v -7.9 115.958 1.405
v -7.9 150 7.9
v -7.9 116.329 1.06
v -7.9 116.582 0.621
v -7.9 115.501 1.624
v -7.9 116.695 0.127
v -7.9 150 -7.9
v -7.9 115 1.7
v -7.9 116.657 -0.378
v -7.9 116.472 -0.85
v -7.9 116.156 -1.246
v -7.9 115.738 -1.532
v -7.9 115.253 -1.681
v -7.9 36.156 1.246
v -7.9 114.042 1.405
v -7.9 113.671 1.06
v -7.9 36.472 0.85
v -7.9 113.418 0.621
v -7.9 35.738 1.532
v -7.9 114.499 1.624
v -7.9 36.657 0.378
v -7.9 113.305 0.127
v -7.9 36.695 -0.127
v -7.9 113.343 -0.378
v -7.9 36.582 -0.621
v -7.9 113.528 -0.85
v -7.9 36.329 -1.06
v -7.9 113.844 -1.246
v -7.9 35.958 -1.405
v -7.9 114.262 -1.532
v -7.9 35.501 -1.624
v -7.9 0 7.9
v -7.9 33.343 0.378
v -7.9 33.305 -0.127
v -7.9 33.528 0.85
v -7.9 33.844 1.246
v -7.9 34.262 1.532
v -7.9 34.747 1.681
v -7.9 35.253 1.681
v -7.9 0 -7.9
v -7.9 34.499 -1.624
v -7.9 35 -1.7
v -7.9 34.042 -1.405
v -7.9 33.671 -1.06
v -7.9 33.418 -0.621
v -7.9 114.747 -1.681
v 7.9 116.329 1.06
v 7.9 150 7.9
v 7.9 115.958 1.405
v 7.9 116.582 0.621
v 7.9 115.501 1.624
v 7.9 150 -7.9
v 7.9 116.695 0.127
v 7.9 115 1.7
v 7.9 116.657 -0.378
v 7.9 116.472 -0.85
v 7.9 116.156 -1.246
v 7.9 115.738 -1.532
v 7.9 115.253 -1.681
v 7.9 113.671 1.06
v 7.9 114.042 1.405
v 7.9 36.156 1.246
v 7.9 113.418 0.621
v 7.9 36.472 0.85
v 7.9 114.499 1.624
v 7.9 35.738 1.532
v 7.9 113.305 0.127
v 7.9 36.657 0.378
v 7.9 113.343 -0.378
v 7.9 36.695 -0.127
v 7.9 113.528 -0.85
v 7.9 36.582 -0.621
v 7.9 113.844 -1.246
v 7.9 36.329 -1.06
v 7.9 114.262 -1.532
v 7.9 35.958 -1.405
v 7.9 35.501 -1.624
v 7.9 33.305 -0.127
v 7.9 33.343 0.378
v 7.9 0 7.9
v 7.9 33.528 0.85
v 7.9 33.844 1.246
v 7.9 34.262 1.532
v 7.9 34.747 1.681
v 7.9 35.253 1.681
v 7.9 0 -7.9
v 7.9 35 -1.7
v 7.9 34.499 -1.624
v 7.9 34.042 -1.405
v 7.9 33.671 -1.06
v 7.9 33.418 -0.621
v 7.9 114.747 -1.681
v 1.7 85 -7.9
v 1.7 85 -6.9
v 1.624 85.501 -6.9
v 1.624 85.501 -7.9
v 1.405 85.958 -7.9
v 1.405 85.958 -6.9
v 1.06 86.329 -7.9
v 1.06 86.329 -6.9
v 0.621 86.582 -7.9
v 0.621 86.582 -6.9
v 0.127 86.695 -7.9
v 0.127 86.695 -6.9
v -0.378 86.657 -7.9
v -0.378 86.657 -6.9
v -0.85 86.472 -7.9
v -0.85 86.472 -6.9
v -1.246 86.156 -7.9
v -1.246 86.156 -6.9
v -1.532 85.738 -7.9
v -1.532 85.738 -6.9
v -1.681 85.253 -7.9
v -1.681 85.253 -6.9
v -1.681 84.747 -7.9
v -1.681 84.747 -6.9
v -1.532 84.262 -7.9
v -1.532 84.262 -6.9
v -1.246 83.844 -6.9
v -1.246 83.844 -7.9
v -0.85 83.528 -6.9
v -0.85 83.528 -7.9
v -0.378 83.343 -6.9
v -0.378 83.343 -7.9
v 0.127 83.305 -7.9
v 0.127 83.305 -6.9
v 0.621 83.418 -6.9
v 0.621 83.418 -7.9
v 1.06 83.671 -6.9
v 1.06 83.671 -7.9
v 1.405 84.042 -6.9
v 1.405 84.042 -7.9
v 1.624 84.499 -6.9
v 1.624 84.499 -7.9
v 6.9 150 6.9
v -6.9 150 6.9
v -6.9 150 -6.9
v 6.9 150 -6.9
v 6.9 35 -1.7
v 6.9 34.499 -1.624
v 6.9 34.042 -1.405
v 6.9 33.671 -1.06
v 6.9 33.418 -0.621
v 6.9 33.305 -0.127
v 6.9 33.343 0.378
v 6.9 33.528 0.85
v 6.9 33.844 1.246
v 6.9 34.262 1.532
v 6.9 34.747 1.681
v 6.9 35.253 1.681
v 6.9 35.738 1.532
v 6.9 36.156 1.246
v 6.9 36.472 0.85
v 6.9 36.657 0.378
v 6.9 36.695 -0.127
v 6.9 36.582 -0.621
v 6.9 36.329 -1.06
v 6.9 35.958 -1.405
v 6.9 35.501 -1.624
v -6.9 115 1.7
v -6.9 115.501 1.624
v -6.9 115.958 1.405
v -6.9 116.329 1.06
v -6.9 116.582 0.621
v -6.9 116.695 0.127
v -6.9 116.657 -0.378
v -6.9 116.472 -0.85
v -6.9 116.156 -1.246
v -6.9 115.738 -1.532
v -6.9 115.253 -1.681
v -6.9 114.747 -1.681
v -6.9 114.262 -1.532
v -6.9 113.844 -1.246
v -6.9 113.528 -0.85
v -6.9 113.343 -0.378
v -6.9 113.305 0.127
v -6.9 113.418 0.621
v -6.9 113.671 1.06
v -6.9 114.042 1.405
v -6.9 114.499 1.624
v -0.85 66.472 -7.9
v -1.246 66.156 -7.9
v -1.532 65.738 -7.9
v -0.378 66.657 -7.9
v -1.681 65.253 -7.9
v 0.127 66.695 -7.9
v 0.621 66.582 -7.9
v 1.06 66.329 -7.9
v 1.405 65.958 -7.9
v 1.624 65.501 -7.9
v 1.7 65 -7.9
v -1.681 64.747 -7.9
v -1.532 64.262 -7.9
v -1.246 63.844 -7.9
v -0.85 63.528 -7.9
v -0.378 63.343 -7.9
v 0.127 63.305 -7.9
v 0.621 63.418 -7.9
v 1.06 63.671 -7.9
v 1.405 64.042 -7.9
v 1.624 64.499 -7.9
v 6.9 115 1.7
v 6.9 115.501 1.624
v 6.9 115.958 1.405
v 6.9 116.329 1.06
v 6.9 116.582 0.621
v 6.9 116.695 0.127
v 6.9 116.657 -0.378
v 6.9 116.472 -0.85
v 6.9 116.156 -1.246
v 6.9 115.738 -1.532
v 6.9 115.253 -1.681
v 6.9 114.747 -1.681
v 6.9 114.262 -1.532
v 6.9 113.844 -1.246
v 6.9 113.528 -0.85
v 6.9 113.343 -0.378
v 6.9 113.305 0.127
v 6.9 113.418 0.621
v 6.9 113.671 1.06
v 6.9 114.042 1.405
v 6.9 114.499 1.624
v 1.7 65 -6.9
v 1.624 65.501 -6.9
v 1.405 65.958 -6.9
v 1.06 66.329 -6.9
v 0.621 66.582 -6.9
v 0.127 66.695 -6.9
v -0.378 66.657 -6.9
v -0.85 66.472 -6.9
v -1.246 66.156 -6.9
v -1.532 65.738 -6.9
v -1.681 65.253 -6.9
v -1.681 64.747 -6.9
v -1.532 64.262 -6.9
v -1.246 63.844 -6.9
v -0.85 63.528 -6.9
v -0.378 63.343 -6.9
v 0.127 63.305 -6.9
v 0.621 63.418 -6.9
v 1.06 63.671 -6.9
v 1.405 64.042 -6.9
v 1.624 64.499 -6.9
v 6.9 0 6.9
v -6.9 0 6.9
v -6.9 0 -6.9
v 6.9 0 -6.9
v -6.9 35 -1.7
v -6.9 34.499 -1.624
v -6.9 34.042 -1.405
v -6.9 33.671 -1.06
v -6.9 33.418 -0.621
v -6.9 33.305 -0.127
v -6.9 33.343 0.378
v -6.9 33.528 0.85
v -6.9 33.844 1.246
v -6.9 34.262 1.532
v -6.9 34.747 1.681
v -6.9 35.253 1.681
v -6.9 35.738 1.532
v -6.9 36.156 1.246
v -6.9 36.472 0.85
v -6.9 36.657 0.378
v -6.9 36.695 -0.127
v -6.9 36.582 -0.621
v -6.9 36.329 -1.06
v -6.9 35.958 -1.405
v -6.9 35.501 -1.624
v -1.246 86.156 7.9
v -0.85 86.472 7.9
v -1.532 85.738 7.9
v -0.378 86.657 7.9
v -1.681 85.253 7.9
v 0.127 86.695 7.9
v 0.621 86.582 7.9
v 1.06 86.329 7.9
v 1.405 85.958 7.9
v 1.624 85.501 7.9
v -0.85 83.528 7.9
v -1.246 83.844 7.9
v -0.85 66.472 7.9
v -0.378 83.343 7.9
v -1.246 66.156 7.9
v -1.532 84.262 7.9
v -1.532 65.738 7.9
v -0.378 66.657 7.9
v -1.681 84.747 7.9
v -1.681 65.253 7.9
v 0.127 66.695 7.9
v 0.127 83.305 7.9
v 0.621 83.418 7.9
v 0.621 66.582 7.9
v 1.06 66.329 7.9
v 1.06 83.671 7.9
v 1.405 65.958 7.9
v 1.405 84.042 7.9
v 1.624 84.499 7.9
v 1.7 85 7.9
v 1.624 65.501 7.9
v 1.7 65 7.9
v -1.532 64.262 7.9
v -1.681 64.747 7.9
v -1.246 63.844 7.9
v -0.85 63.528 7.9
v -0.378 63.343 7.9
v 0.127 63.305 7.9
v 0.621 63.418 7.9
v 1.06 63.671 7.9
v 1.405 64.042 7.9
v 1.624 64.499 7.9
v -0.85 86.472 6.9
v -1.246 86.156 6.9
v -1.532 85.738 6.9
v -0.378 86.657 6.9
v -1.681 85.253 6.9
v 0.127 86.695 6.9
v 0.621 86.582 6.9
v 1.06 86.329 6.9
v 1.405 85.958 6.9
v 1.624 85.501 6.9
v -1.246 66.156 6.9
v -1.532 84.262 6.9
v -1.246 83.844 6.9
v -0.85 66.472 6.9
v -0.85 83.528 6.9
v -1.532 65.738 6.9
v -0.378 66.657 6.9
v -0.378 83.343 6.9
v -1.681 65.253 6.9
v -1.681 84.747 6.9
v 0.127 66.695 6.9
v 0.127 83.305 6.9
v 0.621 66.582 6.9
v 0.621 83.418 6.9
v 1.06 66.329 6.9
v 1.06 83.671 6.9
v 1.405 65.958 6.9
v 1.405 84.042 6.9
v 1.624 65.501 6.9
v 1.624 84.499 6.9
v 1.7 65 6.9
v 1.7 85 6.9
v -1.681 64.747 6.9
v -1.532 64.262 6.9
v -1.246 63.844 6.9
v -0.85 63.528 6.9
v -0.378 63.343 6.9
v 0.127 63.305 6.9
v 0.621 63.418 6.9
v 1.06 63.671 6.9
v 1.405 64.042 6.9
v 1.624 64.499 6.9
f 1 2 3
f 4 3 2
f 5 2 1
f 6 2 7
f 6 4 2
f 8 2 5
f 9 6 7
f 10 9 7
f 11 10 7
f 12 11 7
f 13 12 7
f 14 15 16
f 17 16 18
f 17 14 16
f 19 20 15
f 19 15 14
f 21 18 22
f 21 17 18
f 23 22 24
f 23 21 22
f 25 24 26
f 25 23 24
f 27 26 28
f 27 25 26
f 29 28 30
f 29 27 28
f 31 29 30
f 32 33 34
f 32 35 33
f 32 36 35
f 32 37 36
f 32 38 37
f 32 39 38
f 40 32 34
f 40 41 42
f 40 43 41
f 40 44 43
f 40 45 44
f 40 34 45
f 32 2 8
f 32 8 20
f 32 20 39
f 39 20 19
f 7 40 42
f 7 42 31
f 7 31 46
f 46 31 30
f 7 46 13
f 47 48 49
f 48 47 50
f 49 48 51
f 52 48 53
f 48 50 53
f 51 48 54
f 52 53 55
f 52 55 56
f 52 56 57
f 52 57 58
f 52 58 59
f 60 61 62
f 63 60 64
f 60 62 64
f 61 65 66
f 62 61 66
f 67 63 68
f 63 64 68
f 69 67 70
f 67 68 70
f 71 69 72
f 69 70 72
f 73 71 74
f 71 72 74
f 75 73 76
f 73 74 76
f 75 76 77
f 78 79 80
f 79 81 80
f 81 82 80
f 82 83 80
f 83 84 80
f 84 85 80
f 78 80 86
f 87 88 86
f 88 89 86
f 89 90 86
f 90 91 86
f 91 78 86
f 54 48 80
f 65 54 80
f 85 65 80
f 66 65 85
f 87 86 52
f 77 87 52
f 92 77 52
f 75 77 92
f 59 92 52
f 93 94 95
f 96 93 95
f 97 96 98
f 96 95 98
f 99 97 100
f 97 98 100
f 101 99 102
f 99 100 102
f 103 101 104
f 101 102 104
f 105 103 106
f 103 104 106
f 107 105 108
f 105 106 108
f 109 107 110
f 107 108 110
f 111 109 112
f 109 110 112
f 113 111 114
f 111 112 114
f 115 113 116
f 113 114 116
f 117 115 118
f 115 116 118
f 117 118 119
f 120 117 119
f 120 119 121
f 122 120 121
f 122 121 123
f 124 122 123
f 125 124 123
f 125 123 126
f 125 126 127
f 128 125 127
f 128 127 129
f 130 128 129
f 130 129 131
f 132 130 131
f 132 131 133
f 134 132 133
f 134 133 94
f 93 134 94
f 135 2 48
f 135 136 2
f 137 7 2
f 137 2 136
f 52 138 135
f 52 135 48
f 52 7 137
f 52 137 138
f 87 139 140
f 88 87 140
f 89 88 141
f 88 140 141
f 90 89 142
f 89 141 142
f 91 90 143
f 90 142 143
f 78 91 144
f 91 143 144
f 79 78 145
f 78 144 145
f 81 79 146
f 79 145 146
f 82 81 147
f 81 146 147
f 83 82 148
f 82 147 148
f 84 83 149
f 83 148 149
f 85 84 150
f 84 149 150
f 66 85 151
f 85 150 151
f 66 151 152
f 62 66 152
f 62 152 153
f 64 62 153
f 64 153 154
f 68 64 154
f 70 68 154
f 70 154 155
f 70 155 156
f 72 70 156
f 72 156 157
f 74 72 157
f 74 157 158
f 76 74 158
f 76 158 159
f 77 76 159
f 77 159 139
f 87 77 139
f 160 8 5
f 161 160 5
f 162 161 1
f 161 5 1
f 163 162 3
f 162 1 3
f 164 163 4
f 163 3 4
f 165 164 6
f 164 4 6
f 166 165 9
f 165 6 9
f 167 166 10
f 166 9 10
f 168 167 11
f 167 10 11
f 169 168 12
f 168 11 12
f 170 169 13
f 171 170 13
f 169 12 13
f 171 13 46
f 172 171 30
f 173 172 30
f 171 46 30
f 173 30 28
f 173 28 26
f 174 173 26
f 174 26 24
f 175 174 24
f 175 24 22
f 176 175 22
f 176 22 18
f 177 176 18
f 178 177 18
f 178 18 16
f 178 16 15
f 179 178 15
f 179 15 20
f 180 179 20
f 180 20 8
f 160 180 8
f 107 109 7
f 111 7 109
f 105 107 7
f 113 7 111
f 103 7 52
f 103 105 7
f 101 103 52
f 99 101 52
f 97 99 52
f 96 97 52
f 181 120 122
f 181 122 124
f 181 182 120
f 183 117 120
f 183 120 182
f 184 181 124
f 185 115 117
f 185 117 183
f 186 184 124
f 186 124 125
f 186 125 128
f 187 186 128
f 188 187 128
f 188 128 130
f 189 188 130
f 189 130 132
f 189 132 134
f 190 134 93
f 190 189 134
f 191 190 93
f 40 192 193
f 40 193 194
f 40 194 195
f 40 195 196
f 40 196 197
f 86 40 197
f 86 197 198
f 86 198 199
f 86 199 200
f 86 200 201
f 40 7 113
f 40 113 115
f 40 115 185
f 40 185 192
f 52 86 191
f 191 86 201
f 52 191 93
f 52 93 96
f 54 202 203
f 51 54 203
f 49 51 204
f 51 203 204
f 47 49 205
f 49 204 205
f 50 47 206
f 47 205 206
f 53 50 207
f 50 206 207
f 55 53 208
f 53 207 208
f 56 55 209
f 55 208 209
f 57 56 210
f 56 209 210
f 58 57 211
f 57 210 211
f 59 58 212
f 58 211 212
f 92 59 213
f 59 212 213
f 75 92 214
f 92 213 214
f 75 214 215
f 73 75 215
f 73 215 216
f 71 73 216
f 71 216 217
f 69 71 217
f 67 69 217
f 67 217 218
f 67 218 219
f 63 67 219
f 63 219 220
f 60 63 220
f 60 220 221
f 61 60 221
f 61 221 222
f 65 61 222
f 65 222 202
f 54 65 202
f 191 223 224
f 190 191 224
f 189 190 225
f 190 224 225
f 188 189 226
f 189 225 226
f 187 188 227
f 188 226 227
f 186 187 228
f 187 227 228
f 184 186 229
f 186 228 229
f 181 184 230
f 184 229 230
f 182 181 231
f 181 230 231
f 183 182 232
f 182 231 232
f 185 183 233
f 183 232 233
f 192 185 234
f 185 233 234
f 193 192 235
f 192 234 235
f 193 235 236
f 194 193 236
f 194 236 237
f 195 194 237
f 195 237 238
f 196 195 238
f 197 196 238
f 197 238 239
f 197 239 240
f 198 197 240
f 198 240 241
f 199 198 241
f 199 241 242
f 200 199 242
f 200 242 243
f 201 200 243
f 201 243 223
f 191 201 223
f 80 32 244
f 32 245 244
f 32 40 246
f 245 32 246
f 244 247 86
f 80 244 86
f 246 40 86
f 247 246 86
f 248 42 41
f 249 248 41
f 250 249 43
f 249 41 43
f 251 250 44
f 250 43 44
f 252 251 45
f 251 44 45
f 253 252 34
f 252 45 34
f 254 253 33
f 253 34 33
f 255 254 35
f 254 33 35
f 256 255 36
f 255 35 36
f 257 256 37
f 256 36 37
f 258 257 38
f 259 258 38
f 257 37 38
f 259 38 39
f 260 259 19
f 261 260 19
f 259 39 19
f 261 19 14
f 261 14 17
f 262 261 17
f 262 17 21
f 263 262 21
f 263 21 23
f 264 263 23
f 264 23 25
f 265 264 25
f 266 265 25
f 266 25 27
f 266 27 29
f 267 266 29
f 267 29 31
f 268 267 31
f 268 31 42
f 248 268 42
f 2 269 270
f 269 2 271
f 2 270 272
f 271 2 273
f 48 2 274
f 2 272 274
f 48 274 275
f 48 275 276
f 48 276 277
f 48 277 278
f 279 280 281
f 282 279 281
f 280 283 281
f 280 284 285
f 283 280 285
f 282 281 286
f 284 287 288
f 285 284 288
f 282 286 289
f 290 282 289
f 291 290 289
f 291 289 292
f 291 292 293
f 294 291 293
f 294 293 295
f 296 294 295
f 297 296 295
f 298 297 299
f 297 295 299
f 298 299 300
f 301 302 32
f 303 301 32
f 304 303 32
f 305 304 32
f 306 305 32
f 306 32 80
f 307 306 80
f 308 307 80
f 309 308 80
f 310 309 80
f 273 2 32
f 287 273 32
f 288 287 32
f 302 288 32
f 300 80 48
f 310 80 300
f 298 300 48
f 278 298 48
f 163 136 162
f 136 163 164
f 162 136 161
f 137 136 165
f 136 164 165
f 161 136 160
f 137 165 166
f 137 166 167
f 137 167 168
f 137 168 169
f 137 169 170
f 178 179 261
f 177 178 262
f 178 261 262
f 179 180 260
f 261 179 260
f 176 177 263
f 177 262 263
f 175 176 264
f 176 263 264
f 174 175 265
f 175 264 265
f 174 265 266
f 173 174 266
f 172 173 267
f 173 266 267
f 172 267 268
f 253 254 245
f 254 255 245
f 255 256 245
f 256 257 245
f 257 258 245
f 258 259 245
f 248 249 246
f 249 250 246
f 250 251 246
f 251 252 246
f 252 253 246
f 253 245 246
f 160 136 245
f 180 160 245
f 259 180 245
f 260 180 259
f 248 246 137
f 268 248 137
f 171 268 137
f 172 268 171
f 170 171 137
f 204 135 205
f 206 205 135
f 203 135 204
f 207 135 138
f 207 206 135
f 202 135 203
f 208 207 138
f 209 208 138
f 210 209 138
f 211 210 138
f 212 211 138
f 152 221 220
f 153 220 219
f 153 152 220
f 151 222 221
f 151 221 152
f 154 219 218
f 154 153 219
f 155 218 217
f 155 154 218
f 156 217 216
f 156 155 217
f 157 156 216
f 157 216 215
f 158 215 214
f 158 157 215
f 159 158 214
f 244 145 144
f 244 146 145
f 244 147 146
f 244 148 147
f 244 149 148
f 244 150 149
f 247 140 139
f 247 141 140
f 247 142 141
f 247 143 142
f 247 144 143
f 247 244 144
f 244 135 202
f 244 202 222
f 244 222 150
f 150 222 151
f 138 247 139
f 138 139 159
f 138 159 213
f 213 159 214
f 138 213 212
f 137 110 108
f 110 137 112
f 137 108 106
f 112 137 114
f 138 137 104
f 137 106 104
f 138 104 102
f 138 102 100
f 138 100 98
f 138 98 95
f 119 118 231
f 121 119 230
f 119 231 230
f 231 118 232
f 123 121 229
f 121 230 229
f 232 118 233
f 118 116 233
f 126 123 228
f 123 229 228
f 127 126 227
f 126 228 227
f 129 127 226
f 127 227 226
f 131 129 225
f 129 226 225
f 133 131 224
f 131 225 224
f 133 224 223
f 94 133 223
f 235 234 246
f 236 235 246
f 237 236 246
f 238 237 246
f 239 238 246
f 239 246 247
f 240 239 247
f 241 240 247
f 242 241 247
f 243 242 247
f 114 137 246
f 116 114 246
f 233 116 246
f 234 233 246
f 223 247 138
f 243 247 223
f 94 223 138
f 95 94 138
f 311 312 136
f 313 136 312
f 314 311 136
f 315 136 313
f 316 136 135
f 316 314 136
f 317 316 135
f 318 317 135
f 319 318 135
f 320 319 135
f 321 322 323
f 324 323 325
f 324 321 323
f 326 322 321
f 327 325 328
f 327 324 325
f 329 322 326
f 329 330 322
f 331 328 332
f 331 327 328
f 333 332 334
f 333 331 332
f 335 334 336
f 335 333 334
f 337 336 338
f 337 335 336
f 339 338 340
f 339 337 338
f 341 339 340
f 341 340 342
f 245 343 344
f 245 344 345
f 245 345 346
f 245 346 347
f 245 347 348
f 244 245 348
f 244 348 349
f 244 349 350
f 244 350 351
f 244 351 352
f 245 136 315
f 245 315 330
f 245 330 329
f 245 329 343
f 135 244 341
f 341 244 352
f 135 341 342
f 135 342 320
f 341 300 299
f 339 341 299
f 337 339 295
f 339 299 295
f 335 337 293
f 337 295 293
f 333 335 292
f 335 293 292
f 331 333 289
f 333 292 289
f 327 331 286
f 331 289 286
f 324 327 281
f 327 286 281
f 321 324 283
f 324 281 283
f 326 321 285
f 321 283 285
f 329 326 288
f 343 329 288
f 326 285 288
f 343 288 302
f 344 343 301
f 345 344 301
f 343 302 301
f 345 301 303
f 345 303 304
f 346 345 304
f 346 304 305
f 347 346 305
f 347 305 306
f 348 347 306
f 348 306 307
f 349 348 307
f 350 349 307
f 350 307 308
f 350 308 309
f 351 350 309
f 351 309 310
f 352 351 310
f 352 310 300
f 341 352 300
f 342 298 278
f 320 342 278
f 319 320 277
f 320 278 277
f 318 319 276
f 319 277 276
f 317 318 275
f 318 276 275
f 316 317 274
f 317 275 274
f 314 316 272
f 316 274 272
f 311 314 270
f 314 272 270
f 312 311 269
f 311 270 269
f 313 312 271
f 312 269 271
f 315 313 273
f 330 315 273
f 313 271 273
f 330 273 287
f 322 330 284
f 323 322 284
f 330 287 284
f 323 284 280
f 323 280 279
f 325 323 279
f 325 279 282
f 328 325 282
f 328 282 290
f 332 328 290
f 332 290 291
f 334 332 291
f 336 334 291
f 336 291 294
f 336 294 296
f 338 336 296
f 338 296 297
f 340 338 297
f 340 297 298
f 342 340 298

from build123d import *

# Parameters (mm, degrees)
SKETCH1_W           = 15.8
SKETCH1_H           = 15.8
SKETCH1_W_2         = 13.8
SKETCH1_H_2         = 13.8
BOSS_EXTRUDE1_DEPTH = 150
SKETCH2_R           = 1.7
CUT_EXTRUDE1_DEPTH  = 152.036584972
SKETCH3_R           = 1.7
CUT_EXTRUDE3_DEPTH  = 152.036584972


with BuildPart() as part:
    # Sketch1 → Boss-Extrude1 (new body)
    with BuildSketch(Plane(origin=(0, 0, 0), x_dir=(1, 0, 0), z_dir=(0, 1, 0))):
        Rectangle(SKETCH1_W, SKETCH1_H)
        Rectangle(SKETCH1_W_2, SKETCH1_H_2, mode=Mode.SUBTRACT)
    extrude(amount=BOSS_EXTRUDE1_DEPTH)

    # Sketch2 → Cut-Extrude1 (cut, through all)
    with BuildSketch(Plane.ZY.offset(7.9)):
        with Locations((0, 115)):
            Circle(SKETCH2_R)
        with Locations(Location((0, 35, 0), (0, 0, 180))):
            Circle(SKETCH2_R)
    extrude(amount=-CUT_EXTRUDE1_DEPTH, mode=Mode.SUBTRACT)

    # Sketch3 → Cut-Extrude3 (cut, through all)
    with BuildSketch(Plane.XY.offset(7.9)):
        with Locations((0, 85)):
            Circle(SKETCH3_R)
        with Locations((0, 65)):
            Circle(SKETCH3_R)
    extrude(amount=-CUT_EXTRUDE3_DEPTH, mode=Mode.SUBTRACT)


solid = part.part
